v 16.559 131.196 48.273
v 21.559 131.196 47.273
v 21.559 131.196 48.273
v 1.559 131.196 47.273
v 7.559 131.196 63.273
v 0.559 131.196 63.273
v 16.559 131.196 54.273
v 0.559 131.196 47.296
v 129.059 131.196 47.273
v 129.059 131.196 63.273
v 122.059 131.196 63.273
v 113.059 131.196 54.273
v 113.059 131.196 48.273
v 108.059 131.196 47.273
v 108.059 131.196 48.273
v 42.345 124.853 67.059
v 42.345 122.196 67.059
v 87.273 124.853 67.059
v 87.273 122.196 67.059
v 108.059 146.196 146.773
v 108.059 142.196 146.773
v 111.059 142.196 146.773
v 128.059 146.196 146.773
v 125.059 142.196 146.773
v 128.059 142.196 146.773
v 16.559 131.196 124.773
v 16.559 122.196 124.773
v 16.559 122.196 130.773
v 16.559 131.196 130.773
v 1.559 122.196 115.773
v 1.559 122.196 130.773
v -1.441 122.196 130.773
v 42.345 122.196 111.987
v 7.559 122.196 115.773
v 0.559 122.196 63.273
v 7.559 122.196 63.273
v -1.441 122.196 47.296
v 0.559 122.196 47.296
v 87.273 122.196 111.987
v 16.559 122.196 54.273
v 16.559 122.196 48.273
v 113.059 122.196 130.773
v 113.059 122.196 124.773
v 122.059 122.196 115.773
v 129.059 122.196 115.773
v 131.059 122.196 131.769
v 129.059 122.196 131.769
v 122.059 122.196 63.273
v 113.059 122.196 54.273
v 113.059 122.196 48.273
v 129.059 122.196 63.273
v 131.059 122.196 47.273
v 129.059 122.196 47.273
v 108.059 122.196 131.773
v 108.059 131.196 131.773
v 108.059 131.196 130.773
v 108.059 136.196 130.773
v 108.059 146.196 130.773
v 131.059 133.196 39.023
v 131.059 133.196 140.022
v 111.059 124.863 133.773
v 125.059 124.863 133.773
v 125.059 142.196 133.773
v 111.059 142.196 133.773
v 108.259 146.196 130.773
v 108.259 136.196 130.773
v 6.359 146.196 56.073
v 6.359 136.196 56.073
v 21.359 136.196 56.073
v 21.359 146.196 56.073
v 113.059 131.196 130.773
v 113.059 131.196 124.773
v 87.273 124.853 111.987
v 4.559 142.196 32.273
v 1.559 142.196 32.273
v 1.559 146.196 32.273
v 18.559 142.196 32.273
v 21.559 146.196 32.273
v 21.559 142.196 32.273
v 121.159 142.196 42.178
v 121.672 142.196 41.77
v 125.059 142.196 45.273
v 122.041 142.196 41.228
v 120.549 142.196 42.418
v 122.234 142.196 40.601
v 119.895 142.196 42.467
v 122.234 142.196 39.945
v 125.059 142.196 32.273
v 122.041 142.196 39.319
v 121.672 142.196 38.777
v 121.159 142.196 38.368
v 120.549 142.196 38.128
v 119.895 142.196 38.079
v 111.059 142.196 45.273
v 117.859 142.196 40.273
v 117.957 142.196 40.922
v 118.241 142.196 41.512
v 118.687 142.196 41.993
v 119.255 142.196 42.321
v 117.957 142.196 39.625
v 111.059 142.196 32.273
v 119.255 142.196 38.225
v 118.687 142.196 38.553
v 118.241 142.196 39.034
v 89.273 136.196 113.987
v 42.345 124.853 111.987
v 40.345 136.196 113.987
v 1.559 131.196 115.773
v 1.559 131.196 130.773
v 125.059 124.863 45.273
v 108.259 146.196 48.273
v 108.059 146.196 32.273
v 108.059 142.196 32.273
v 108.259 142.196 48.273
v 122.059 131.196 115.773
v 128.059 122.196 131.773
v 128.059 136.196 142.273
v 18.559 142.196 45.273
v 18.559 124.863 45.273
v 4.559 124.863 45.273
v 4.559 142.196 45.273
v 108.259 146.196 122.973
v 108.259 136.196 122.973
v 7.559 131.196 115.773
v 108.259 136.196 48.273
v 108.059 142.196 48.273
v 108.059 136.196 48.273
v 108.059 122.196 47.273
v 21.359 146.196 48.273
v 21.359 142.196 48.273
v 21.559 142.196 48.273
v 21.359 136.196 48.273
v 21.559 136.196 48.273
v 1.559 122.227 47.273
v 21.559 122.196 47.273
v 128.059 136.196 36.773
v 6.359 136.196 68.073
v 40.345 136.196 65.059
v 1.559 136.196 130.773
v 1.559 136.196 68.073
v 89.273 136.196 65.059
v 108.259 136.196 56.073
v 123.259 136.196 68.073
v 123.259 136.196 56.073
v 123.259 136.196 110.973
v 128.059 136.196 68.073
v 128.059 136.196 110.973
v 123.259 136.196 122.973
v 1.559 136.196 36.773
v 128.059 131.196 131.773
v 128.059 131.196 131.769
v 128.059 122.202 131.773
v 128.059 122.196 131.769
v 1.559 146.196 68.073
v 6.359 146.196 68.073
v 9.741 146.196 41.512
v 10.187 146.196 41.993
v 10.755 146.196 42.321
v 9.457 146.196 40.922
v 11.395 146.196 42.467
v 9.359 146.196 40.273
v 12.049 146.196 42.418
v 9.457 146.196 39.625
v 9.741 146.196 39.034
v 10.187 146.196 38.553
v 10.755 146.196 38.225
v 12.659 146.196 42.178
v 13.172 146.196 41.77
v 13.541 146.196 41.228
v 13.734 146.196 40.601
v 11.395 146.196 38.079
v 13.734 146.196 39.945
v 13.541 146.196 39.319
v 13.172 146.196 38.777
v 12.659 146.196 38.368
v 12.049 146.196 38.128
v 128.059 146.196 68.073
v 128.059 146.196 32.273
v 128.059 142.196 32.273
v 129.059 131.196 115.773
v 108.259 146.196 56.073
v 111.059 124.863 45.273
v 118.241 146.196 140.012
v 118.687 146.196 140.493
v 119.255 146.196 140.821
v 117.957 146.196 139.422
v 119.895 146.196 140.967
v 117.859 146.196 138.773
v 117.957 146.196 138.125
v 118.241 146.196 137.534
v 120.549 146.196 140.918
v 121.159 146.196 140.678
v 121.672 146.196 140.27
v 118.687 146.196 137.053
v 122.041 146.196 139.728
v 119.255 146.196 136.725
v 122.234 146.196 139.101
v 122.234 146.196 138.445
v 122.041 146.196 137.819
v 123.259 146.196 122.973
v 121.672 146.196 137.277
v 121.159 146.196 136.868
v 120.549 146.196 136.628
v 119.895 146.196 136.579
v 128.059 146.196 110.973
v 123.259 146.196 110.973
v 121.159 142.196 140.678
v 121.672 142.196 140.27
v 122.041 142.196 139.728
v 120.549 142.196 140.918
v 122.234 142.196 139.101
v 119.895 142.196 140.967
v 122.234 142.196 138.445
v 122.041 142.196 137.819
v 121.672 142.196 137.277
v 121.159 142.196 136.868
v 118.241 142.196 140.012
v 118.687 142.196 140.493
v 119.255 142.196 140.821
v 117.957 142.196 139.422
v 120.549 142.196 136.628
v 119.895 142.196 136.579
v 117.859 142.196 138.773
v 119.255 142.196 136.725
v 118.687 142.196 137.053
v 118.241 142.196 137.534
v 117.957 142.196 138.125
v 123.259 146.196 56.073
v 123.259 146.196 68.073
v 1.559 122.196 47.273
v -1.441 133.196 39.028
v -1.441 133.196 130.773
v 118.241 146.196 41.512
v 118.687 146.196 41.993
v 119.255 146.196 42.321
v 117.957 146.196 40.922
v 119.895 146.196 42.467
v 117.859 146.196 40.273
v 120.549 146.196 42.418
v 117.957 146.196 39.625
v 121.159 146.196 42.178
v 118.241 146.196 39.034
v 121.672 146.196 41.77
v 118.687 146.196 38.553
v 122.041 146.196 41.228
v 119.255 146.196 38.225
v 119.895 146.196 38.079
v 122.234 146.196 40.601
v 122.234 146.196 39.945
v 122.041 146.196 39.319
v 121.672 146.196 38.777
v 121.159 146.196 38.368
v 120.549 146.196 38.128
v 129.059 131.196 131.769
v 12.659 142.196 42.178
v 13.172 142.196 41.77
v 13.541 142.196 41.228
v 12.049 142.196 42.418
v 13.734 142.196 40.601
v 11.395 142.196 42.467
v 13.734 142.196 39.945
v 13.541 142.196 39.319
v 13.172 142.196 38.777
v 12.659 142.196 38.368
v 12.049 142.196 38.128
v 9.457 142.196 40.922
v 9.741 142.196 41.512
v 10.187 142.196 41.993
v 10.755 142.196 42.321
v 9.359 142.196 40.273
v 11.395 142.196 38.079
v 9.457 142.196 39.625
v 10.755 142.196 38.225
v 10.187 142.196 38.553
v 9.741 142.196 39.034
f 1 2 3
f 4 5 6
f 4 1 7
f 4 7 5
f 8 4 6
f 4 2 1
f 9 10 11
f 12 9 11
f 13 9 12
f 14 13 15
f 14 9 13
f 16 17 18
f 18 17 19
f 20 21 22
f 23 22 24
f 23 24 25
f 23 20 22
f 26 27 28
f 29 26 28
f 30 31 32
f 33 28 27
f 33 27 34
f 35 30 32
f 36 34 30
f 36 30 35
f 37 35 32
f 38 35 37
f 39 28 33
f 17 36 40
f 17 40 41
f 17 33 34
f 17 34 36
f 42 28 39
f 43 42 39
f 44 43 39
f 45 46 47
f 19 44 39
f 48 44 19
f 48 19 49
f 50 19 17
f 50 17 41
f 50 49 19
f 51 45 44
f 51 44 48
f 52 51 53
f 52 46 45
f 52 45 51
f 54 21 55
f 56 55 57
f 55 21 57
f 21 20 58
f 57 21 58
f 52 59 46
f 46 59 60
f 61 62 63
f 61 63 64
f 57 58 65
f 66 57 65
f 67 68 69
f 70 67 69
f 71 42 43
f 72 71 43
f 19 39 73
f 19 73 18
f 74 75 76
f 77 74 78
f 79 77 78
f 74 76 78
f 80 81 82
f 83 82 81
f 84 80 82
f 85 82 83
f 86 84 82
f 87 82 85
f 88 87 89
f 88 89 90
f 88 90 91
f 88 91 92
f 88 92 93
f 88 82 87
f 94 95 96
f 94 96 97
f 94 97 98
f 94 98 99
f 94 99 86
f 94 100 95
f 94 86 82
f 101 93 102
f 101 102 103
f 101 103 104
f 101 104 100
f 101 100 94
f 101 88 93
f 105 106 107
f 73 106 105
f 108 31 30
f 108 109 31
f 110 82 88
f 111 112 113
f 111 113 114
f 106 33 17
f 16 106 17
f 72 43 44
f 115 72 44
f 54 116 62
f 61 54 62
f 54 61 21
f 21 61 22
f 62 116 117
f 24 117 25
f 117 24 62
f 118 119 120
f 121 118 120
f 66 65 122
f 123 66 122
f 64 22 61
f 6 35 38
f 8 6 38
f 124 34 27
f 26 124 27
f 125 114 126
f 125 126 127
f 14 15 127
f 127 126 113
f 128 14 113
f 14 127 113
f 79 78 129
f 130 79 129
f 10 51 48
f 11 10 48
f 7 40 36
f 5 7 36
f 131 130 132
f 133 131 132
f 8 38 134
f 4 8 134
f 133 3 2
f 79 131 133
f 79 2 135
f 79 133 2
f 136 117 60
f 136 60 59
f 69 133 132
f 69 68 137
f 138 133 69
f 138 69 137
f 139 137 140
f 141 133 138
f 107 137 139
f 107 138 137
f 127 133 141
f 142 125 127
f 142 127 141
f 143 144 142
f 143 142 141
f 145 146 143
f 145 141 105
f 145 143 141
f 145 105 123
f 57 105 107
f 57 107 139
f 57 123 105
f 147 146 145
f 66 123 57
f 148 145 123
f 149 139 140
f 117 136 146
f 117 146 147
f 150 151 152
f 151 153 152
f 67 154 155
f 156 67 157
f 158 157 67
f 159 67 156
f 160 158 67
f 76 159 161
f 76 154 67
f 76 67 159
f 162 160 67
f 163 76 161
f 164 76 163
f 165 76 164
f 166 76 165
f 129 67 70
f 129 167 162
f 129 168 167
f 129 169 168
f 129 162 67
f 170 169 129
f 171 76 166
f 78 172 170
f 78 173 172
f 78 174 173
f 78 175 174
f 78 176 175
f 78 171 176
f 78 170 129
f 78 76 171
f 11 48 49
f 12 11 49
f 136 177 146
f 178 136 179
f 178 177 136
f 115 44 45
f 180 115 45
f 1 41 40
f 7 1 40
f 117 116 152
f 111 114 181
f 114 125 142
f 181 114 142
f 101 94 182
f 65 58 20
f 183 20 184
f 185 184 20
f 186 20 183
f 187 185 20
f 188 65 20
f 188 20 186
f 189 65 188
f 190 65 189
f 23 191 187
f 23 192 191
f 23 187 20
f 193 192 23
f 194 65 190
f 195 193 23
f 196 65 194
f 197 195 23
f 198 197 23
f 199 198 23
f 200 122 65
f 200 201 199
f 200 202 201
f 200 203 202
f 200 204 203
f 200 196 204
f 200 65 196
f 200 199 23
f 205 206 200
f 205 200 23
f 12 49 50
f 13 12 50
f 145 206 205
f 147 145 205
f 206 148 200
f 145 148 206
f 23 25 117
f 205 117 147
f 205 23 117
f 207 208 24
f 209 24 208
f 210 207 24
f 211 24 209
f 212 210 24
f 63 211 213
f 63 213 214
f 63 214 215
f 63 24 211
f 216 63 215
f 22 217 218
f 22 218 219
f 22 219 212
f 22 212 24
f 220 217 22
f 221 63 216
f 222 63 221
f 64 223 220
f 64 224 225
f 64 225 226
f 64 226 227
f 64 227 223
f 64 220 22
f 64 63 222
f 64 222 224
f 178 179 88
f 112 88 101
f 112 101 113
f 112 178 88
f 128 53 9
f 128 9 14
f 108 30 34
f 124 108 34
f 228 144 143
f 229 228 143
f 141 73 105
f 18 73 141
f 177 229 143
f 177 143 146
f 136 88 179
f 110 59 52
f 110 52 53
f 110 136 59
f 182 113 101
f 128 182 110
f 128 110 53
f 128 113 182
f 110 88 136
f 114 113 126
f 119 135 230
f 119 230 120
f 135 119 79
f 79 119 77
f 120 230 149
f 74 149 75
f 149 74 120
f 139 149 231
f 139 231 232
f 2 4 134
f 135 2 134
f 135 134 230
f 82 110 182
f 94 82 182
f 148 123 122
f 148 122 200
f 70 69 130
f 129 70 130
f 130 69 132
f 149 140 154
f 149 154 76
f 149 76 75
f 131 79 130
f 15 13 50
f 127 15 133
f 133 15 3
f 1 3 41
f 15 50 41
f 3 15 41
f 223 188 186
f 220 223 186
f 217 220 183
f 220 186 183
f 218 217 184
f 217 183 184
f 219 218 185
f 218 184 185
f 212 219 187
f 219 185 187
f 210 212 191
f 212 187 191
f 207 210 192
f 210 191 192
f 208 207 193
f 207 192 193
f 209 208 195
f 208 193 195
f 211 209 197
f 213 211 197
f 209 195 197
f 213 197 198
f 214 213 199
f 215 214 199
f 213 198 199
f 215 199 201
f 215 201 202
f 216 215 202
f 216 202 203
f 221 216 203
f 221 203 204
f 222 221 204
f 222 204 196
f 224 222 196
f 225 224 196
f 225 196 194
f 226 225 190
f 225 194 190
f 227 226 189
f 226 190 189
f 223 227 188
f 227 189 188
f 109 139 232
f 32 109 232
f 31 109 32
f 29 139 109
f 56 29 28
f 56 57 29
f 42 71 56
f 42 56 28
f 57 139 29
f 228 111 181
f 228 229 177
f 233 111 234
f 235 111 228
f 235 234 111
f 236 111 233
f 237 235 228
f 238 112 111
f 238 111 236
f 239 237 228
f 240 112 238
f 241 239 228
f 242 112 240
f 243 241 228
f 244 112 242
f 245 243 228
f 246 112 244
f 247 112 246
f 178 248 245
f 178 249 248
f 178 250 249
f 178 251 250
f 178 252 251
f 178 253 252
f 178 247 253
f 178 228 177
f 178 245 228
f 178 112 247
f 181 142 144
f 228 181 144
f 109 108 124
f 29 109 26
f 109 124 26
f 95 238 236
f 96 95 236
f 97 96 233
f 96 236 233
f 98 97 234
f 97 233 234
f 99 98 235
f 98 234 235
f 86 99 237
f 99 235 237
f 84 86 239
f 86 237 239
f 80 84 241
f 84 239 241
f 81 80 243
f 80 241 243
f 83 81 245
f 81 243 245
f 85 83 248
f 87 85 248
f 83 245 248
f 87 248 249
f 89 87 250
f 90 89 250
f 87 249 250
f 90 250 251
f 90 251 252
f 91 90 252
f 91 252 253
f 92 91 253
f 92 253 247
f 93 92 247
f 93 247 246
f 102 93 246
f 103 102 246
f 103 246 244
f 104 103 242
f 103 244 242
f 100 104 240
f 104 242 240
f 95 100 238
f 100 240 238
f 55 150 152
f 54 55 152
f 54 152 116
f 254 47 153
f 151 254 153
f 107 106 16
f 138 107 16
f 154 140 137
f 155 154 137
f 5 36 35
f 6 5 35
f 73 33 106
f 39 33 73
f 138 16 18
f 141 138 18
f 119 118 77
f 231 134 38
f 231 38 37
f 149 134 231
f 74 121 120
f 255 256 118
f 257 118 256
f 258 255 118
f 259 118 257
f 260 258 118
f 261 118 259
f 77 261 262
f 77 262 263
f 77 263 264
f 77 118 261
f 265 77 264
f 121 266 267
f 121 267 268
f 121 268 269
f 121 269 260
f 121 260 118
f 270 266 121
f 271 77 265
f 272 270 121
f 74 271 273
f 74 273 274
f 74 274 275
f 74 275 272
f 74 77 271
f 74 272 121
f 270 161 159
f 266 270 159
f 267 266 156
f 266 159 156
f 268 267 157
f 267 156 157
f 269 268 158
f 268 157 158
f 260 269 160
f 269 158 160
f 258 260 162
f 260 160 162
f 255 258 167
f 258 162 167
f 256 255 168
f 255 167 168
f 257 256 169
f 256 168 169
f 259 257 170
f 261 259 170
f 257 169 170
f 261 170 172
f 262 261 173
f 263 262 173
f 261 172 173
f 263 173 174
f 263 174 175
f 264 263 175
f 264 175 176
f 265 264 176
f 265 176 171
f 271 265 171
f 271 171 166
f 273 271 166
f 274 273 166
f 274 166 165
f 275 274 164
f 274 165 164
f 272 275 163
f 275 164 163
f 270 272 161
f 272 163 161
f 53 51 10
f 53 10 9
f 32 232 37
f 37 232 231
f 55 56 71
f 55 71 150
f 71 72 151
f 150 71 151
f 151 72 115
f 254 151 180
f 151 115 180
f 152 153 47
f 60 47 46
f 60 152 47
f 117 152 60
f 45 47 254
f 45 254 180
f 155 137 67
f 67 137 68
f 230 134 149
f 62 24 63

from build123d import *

# Parameters (mm, degrees)
SKETCH_1_W          = 44.92820323
SKETCH_1_H          = 44.928203231
EXTRUDE_1_DEPTH     = 9
SKETCH_2_W          = 126.5
SKETCH_2_H          = 82.5
SKETCH_2_W_2        = 44.92820323
SKETCH_2_H_2        = 44.928203231
EXTRUDE_2_DEPTH     = 5
CHAMFER_1_SIZE      = 2
CHAMFER_1_SIZE2     = 11.342563639
EXTRUDE_3_DEPTH     = 10
SKETCH_4_W          = 20
SKETCH_4_H          = 16
SKETCH_4_R          = 2.2
EXTRUDE_4_DEPTH     = 4
EXTRUDE_5_DEPTH     = 20
EXTRUDE_6_DEPTH     = 20
SKETCH_7_W          = 14
SKETCH_7_H          = 13
CUT_EXTRUDE_1_DEPTH = 20
EXTRUDE_7_DEPTH     = 3
EXTRUDE_8_DEPTH     = 3
CHAMFER_2_SIZE      = 3
SKETCH_10_W         = 1
SKETCH_10_H         = 16
SKETCH_10_H_2       = 15.995398116
CUT_EXTRUDE_2_DEPTH = 9


with BuildPart() as part:
    # Эскиз1 → Бобышка-Вытянуть1 (new body)
    with BuildSketch(Plane(origin=(0, 122.195974268, 0), x_dir=(1, 0, 0), z_dir=(0, 1, 0))):
        Polygon((16.558980694, -48.273129836), (16.558980694, -54.273129836), (7.558980694, -63.273129836), (1.558980694, -63.273129836), (1.558980694, -115.773129836), (7.558980694, -115.773129836), (16.558980694, -124.773129836), (16.558980694, -130.773129836), (113.058980694, -130.773129836), (113.058980694, -124.773129836), (122.058980694, -115.773129836), (128.058980694, -115.773129836), (128.058980694, -63.273129836), (122.058980694, -63.273129836), (113.058980694, -54.273129836), (113.058980694, -48.273129836), align=None)
        with Locations((64.808980694, -89.523129837)):
            Rectangle(SKETCH_1_W, SKETCH_1_H, mode=Mode.SUBTRACT)
    extrude(amount=EXTRUDE_1_DEPTH)

    # Эскиз2 → Бобышка-Вытянуть2 (add)
    with BuildSketch(Plane(origin=(0, 131.195974268, 0), x_dir=(1, 0, 0), z_dir=(0, 1, 0))):
        with Locations((64.808980694, -89.523129836)):
            Rectangle(SKETCH_2_W, SKETCH_2_H)
        with Locations((64.808980694, -89.523129837)):
            Rectangle(SKETCH_2_W_2, SKETCH_2_H_2, mode=Mode.SUBTRACT)
    extrude(amount=EXTRUDE_2_DEPTH)

    # Фаска1
    chamfer_1_edges = [part.edges().sort_by_distance(p)[0] for p in [
        (64.808980694, 136.195974268, 67.059028221),
        (42.344879079, 136.195974268, 89.523129836),
        (64.808980694, 136.195974268, 111.987231452),
        (87.273082309, 136.195974268, 89.523129836),
    ]]
    chamfer_1_side = [part.faces().sort_by_distance(p)[0] for p in [
        (64.808980694, 136.195974268, 49.78337816),
    ]]
    chamfer(chamfer_1_edges, length=CHAMFER_1_SIZE, length2=CHAMFER_1_SIZE2, reference=chamfer_1_side[0])

    # Эскиз3 → Бобышка-Вытянуть3 (add)
    with BuildSketch(Plane(origin=(0, 136.195974268, 0), x_dir=(1, 0, 0), z_dir=(0, 1, 0))):
        Polygon((128.058980694, -68.073129836), (128.058980694, -48.273129836), (108.258980694, -48.273129836), (108.258980694, -56.073129836), (123.258980694, -56.073129836), (123.258980694, -68.073129836), align=None)
        Polygon((21.358980694, -48.273129836), (1.558980694, -48.273129836), (1.558980694, -68.073129836), (6.358980694, -68.073129836), (6.358980694, -56.073129836), (21.358980694, -56.073129836), align=None)
        Polygon((128.058980694, -110.973129836), (128.058980694, -130.773129836), (108.258980694, -130.773129836), (108.258980694, -122.973129836), (123.258980694, -122.973129836), (123.258980694, -110.973129836), align=None)
    extrude(amount=EXTRUDE_3_DEPTH)

    # Эскиз4 → Бобышка-Вытянуть4 (add)
    # profile 1 of 3: a face of its own
    with BuildSketch(Plane(origin=(0, 146.195974268, 0), x_dir=(1, 0, 0), z_dir=(0, 1, 0))):
        with Locations((118.058980694, -138.773129836)):
            Rectangle(SKETCH_4_W, SKETCH_4_H)
        with Locations(Location((120.058980694, -138.773129836, 0), (0, 0, 180))):
            Circle(SKETCH_4_R, mode=Mode.SUBTRACT)
    # profile 2 of 3: a face of its own
    with BuildSketch(Plane(origin=(0, 146.195974268, 0), x_dir=(1, 0, 0), z_dir=(0, 1, 0))):
        Polygon((128.058980694, -48.273129836), (128.058980694, -32.273129836), (108.058980694, -32.273129836), (108.258980694, -48.273129836), align=None)
        with Locations(Location((120.058980694, -40.273129836, 0), (0, 0, 180))):
            Circle(SKETCH_4_R, mode=Mode.SUBTRACT)
    # profile 3 of 3: a face of its own
    with BuildSketch(Plane(origin=(0, 146.195974268, 0), x_dir=(1, 0, 0), z_dir=(0, 1, 0))):
        Polygon((1.558980694, -48.273129836), (1.558980694, -32.273129836), (21.558980694, -32.273129836), (21.358980694, -48.273129836), align=None)
        with Locations(Location((11.558980694, -40.273129836, 0), (0, 0, 180))):
            Circle(SKETCH_4_R, mode=Mode.SUBTRACT)
    extrude(amount=-EXTRUDE_4_DEPTH)

    # Эскиз5 → Бобышка-Вытянуть5 (add)
    with BuildSketch(Plane(origin=(128.058980694, 0, 0), x_dir=(0, 0, -1), z_dir=(1, 0, 0))):
        Polygon((-146.773129836, 142.195974268), (-130.773129836, 142.195974268), (-130.773129836, 131.195974268), (-131.773129836, 131.195974268), (-131.773129836, 122.195974268), align=None)
        Polygon((-32.273129836, 142.195974268), (-48.273129836, 142.195974268), (-48.273129836, 131.195974268), (-47.273129836, 131.195974268), (-47.273129836, 122.195974268), align=None)
    extrude(amount=-EXTRUDE_5_DEPTH)

    # Эскиз6 → Бобышка-Вытянуть6 (add)
    with BuildSketch(Plane.ZY.offset(-1.558980694)):
        Polygon((32.273129836, 142.195974268), (48.273129836, 142.195974268), (48.273129836, 131.195974268), (47.273129836, 131.195974268), (47.273129836, 122.195974268), align=None)
    extrude(amount=-EXTRUDE_6_DEPTH)

    # Эскиз7 → Вырез-Вытянуть1 (cut)
    with BuildSketch(Plane(origin=(0, 122.195974268, 0), x_dir=(-1, 0, 0), z_dir=(0, -1, 0))):
        with Locations((-11.558980694, -38.773129836)):
            Rectangle(SKETCH_7_W, SKETCH_7_H)
        with Locations((-118.058980694, -38.773129836)):
            Rectangle(SKETCH_7_W, SKETCH_7_H)
        with Locations((-118.058980694, -140.273129836)):
            Rectangle(SKETCH_7_W, SKETCH_7_H)
    extrude(amount=-CUT_EXTRUDE_1_DEPTH, mode=Mode.SUBTRACT)

    # Эскиз8 → Бобышка-Вытянуть7 (add)
    with BuildSketch(Plane(origin=(128.058980694, 0, 0), x_dir=(0, 0, -1), z_dir=(1, 0, 0))):
        Polygon((-142.273129836, 136.195974268), (-36.773129836, 136.195974268), (-47.273129836, 122.195974268), (-131.768527952, 122.195974268), align=None)
    extrude(amount=EXTRUDE_7_DEPTH)

    # Эскиз9 → Бобышка-Вытянуть8 (add)
    with BuildSketch(Plane.ZY.offset(-1.558980694)):
        Polygon((47.296106509, 122.195974268), (36.773129836, 136.195974268), (130.773129836, 136.195974268), (130.773129836, 122.195974268), align=None)
    extrude(amount=EXTRUDE_8_DEPTH)

    # Фаска2
    chamfer_2_edges = [part.edges().sort_by_distance(p)[0] for p in [
        (131.058980694, 136.195974268, 89.523129836),
        (-1.441019306, 136.195974268, 83.773129836),
    ]]
    chamfer(chamfer_2_edges, length=CHAMFER_2_SIZE - 0.0001)  # a hair under: the kernel refuses the full size

    # Эскиз10 → Вырез-Вытянуть2 (cut)
    with BuildSketch(Plane(origin=(0, 122.195974268, 0), x_dir=(-1, 0, 0), z_dir=(0, -1, 0))):
        with Locations((-128.558980694, -55.273129836)):
            Rectangle(SKETCH_10_W, SKETCH_10_H)
        with Locations((-128.558980694, -123.770828894)):
            Rectangle(SKETCH_10_W, SKETCH_10_H_2)
        Polygon((-1.558980694, -47.273129836), (-1.558980694, -63.273129836), (-0.558980694, -63.273129836), (-0.558980694, -47.296106509), align=None)
    extrude(amount=-CUT_EXTRUDE_2_DEPTH, mode=Mode.SUBTRACT)


solid = part.part
